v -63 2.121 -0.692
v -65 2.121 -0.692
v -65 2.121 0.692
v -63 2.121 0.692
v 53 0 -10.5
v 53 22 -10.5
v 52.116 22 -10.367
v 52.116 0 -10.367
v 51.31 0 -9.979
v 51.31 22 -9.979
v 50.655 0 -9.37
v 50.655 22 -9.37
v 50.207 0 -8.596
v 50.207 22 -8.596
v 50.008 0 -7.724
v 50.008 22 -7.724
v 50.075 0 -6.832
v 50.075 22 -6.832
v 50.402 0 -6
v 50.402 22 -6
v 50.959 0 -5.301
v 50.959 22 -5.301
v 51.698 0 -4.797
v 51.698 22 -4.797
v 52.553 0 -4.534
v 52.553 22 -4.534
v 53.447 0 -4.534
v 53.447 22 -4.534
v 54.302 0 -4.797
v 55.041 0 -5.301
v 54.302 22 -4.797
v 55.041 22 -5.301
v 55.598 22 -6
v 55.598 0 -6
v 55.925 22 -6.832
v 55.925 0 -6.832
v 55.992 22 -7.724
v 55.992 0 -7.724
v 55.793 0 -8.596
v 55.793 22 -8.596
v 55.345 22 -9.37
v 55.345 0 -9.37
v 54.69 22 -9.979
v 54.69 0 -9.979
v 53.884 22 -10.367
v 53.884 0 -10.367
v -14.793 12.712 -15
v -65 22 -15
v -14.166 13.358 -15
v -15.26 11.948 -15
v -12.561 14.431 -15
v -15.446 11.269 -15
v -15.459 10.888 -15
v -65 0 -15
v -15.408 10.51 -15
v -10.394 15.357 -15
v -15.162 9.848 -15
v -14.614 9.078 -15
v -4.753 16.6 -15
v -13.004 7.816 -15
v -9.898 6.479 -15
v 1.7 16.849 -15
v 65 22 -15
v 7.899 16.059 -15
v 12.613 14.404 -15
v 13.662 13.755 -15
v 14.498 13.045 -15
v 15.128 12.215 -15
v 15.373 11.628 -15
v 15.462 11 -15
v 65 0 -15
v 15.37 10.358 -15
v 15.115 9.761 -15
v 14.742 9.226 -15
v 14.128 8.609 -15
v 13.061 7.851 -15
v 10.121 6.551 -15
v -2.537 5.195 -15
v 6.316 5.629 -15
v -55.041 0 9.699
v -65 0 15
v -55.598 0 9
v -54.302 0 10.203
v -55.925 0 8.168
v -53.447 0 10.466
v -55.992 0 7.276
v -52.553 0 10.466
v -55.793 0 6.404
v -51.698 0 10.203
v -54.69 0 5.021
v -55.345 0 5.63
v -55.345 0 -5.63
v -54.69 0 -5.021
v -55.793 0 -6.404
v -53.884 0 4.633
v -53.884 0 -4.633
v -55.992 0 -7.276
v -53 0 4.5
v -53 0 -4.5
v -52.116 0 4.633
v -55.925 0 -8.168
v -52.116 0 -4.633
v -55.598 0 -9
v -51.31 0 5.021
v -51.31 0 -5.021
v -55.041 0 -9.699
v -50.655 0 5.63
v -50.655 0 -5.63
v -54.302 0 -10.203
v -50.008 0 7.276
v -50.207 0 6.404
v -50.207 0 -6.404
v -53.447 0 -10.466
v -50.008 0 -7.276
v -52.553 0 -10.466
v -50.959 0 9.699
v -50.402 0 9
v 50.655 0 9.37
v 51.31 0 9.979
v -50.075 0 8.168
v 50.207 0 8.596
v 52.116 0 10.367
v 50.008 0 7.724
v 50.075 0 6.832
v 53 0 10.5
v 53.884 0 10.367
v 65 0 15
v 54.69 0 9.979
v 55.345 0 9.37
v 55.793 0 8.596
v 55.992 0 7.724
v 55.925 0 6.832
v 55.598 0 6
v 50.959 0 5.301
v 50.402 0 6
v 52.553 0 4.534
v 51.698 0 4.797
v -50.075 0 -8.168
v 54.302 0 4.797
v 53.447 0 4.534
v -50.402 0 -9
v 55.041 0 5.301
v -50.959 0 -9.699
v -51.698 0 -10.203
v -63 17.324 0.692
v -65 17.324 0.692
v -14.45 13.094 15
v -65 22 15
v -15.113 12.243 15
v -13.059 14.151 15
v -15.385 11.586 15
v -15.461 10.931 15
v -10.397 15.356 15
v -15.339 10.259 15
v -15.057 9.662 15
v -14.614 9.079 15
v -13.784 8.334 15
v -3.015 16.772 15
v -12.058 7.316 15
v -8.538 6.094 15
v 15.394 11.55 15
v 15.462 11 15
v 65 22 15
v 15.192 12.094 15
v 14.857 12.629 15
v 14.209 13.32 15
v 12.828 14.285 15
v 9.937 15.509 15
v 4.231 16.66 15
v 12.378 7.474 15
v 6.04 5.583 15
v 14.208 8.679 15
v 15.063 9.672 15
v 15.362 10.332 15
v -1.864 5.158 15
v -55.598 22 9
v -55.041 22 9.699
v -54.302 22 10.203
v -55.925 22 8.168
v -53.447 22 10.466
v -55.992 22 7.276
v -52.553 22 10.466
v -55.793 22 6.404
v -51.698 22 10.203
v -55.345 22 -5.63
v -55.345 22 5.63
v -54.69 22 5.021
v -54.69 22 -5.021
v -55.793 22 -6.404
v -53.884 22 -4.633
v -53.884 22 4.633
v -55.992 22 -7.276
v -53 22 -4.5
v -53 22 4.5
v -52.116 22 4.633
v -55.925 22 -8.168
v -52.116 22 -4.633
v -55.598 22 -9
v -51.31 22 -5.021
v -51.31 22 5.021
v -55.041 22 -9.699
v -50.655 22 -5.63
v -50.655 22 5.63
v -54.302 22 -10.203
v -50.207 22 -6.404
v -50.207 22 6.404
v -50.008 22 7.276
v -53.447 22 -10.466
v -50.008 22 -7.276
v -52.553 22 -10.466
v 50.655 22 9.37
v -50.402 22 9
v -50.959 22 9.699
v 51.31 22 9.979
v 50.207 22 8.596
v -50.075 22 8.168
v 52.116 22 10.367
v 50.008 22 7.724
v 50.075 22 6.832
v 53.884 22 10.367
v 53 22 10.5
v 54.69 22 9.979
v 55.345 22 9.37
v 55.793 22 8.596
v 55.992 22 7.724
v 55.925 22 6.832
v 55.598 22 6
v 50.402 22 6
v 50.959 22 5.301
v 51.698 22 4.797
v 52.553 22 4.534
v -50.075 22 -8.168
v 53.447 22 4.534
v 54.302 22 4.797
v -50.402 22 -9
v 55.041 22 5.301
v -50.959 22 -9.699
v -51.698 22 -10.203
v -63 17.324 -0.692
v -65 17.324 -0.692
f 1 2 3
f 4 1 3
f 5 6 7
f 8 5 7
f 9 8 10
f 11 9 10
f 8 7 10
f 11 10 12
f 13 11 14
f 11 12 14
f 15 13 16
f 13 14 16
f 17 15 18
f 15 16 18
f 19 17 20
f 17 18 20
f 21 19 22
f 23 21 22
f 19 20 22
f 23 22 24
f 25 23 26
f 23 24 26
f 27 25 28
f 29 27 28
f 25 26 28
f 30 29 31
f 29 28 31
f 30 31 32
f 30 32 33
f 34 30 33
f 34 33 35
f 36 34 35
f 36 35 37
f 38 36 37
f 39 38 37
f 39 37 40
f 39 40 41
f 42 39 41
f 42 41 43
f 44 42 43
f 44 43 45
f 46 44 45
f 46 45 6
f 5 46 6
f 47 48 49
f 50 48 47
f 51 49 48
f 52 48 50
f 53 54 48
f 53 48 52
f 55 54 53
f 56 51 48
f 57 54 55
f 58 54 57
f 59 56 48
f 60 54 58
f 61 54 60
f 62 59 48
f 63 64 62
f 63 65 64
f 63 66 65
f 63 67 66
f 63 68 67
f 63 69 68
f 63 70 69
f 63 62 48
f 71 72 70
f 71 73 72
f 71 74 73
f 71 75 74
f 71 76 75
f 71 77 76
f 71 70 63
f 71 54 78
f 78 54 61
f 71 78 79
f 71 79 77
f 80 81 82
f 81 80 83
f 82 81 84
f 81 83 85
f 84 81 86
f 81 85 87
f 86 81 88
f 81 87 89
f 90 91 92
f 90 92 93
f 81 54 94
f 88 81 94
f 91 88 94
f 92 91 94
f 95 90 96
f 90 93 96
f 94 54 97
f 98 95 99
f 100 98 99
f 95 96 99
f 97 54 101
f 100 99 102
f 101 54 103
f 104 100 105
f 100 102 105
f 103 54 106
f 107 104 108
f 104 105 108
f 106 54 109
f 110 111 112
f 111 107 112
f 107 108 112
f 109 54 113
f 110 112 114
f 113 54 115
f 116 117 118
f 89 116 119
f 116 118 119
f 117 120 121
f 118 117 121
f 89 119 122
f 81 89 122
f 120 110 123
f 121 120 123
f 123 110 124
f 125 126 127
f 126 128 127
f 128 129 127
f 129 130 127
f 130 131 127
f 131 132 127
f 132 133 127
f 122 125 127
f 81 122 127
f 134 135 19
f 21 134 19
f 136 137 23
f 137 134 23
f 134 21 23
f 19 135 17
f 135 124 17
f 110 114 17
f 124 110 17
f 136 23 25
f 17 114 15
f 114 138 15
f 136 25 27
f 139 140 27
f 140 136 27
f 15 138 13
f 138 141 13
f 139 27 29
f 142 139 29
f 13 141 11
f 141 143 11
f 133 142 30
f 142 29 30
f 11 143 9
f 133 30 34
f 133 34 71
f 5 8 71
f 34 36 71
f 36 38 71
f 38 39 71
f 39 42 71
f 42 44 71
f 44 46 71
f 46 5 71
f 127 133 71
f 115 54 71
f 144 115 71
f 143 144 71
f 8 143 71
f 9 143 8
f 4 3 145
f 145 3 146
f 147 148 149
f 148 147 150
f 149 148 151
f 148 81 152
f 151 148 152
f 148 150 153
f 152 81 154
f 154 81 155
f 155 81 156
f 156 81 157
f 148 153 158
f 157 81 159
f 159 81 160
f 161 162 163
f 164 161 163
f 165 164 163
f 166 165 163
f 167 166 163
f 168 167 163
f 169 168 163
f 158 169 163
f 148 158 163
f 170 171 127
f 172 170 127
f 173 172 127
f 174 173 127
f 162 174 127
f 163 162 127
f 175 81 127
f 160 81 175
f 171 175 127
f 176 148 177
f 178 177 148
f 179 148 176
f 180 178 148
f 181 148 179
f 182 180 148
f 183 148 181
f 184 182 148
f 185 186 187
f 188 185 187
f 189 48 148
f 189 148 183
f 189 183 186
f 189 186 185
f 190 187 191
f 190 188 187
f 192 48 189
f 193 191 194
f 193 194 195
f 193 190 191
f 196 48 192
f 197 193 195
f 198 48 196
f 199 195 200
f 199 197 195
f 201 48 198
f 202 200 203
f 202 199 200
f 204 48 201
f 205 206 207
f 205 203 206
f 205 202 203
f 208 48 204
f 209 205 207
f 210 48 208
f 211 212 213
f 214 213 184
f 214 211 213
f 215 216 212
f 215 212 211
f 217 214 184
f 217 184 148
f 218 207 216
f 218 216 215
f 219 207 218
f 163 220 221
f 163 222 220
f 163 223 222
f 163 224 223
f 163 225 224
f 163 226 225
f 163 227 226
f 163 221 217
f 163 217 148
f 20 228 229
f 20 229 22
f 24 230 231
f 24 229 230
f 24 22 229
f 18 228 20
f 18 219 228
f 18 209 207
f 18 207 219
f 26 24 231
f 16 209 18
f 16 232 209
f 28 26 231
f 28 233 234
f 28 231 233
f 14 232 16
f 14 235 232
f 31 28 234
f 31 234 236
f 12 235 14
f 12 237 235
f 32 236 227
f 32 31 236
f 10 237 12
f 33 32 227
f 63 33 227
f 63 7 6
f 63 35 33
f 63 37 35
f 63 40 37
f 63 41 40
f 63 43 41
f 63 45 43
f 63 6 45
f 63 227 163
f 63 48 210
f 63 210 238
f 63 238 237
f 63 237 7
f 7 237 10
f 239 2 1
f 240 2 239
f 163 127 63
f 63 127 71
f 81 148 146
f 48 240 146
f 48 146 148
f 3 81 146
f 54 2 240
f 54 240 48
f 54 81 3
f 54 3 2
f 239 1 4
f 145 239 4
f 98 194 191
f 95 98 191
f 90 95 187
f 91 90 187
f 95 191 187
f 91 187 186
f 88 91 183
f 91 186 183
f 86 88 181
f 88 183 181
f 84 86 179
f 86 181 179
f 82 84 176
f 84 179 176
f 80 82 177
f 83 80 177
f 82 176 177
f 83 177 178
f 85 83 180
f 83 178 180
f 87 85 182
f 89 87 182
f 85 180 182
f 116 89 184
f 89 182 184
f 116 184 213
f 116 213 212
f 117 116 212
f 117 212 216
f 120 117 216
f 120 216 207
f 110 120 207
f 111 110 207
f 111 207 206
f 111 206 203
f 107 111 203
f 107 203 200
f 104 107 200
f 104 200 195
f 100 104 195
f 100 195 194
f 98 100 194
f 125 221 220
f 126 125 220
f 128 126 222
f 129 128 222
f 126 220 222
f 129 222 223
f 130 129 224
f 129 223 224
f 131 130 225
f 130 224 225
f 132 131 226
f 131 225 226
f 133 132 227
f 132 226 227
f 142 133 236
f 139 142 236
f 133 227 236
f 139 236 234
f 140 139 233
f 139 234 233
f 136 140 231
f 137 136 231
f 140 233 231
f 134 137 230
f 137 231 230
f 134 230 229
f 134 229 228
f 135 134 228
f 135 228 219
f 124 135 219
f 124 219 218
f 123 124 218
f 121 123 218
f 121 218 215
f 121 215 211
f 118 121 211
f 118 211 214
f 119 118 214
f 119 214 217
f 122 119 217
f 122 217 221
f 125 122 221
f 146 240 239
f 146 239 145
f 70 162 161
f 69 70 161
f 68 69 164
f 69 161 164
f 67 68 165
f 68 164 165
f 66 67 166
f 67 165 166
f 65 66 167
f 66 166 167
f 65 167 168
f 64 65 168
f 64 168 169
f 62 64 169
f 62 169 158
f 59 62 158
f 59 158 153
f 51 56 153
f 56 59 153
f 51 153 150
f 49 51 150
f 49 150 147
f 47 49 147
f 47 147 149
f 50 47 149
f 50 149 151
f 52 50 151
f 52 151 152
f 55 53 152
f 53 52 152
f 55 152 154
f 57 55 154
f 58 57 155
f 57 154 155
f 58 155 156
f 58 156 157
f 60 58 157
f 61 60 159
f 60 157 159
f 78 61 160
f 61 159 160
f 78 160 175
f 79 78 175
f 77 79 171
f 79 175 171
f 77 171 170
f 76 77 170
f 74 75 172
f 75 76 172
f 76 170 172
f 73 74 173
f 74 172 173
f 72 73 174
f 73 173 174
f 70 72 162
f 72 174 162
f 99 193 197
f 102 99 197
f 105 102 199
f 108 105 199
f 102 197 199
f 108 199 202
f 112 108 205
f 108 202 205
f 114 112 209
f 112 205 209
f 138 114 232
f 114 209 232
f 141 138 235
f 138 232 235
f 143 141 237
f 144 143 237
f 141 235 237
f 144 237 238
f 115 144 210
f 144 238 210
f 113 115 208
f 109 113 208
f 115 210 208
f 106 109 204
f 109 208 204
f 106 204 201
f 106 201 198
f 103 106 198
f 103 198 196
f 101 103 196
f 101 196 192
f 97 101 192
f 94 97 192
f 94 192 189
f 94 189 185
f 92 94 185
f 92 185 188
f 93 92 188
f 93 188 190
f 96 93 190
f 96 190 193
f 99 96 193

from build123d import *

# Parameters (mm, degrees)
SKETCH1_W           = 130
SKETCH1_H           = 30
BOSS_EXTRUDE1_DEPTH = 22
SKETCH2_RX          = 15.461746976
SKETCH2_RY          = 5.884694745
CUT_EXTRUDE1_DEPTH  = 75.893257373
SKETCH3_R           = 3
CUT_EXTRUDE2_DEPTH  = 71.242437461
SKETCH4_W           = 1.384926884
SKETCH4_H           = 15.203419573
CUT_EXTRUDE3_DEPTH  = 2


with BuildPart() as part:
    # Sketch1 → Boss-Extrude1 (new body)
    with BuildSketch(Plane(origin=(0, 0, 0), x_dir=(1, 0, 0), z_dir=(0, 1, 0))):
        Rectangle(SKETCH1_W, SKETCH1_H)
    extrude(amount=BOSS_EXTRUDE1_DEPTH)

    # Sketch2 → Cut-Extrude1 (cut, through all)
    with BuildSketch(Plane.XY.offset(15)):
        with Locations((0, 11)):
            Ellipse(SKETCH2_RX, SKETCH2_RY)
    extrude(amount=-CUT_EXTRUDE1_DEPTH, mode=Mode.SUBTRACT)

    # Sketch3 → Cut-Extrude2 (cut, through all)
    with BuildSketch(Plane(origin=(0, 22, 0), x_dir=(1, 0, 0), z_dir=(0, 1, 0))):
        with Locations(Location((-53, 7.5, 0), (0, 0, 270))):
            Circle(SKETCH3_R)
        with Locations(Location((53, 7.5, 0), (0, 0, 90))):
            Circle(SKETCH3_R)
        with Locations(Location((53, -7.5, 0), (0, 0, 270))):
            Circle(SKETCH3_R)
        with Locations(Location((-53, -7.5, 0), (0, 0, 90))):
            Circle(SKETCH3_R)
    extrude(amount=-CUT_EXTRUDE2_DEPTH, mode=Mode.SUBTRACT)

    # Sketch4 → Cut-Extrude3 (cut)
    with BuildSketch(Plane.ZY.offset(65)):
        with Locations((0, 9.722789651)):
            Rectangle(SKETCH4_W, SKETCH4_H)
    extrude(amount=-CUT_EXTRUDE3_DEPTH, mode=Mode.SUBTRACT)


solid = part.part
